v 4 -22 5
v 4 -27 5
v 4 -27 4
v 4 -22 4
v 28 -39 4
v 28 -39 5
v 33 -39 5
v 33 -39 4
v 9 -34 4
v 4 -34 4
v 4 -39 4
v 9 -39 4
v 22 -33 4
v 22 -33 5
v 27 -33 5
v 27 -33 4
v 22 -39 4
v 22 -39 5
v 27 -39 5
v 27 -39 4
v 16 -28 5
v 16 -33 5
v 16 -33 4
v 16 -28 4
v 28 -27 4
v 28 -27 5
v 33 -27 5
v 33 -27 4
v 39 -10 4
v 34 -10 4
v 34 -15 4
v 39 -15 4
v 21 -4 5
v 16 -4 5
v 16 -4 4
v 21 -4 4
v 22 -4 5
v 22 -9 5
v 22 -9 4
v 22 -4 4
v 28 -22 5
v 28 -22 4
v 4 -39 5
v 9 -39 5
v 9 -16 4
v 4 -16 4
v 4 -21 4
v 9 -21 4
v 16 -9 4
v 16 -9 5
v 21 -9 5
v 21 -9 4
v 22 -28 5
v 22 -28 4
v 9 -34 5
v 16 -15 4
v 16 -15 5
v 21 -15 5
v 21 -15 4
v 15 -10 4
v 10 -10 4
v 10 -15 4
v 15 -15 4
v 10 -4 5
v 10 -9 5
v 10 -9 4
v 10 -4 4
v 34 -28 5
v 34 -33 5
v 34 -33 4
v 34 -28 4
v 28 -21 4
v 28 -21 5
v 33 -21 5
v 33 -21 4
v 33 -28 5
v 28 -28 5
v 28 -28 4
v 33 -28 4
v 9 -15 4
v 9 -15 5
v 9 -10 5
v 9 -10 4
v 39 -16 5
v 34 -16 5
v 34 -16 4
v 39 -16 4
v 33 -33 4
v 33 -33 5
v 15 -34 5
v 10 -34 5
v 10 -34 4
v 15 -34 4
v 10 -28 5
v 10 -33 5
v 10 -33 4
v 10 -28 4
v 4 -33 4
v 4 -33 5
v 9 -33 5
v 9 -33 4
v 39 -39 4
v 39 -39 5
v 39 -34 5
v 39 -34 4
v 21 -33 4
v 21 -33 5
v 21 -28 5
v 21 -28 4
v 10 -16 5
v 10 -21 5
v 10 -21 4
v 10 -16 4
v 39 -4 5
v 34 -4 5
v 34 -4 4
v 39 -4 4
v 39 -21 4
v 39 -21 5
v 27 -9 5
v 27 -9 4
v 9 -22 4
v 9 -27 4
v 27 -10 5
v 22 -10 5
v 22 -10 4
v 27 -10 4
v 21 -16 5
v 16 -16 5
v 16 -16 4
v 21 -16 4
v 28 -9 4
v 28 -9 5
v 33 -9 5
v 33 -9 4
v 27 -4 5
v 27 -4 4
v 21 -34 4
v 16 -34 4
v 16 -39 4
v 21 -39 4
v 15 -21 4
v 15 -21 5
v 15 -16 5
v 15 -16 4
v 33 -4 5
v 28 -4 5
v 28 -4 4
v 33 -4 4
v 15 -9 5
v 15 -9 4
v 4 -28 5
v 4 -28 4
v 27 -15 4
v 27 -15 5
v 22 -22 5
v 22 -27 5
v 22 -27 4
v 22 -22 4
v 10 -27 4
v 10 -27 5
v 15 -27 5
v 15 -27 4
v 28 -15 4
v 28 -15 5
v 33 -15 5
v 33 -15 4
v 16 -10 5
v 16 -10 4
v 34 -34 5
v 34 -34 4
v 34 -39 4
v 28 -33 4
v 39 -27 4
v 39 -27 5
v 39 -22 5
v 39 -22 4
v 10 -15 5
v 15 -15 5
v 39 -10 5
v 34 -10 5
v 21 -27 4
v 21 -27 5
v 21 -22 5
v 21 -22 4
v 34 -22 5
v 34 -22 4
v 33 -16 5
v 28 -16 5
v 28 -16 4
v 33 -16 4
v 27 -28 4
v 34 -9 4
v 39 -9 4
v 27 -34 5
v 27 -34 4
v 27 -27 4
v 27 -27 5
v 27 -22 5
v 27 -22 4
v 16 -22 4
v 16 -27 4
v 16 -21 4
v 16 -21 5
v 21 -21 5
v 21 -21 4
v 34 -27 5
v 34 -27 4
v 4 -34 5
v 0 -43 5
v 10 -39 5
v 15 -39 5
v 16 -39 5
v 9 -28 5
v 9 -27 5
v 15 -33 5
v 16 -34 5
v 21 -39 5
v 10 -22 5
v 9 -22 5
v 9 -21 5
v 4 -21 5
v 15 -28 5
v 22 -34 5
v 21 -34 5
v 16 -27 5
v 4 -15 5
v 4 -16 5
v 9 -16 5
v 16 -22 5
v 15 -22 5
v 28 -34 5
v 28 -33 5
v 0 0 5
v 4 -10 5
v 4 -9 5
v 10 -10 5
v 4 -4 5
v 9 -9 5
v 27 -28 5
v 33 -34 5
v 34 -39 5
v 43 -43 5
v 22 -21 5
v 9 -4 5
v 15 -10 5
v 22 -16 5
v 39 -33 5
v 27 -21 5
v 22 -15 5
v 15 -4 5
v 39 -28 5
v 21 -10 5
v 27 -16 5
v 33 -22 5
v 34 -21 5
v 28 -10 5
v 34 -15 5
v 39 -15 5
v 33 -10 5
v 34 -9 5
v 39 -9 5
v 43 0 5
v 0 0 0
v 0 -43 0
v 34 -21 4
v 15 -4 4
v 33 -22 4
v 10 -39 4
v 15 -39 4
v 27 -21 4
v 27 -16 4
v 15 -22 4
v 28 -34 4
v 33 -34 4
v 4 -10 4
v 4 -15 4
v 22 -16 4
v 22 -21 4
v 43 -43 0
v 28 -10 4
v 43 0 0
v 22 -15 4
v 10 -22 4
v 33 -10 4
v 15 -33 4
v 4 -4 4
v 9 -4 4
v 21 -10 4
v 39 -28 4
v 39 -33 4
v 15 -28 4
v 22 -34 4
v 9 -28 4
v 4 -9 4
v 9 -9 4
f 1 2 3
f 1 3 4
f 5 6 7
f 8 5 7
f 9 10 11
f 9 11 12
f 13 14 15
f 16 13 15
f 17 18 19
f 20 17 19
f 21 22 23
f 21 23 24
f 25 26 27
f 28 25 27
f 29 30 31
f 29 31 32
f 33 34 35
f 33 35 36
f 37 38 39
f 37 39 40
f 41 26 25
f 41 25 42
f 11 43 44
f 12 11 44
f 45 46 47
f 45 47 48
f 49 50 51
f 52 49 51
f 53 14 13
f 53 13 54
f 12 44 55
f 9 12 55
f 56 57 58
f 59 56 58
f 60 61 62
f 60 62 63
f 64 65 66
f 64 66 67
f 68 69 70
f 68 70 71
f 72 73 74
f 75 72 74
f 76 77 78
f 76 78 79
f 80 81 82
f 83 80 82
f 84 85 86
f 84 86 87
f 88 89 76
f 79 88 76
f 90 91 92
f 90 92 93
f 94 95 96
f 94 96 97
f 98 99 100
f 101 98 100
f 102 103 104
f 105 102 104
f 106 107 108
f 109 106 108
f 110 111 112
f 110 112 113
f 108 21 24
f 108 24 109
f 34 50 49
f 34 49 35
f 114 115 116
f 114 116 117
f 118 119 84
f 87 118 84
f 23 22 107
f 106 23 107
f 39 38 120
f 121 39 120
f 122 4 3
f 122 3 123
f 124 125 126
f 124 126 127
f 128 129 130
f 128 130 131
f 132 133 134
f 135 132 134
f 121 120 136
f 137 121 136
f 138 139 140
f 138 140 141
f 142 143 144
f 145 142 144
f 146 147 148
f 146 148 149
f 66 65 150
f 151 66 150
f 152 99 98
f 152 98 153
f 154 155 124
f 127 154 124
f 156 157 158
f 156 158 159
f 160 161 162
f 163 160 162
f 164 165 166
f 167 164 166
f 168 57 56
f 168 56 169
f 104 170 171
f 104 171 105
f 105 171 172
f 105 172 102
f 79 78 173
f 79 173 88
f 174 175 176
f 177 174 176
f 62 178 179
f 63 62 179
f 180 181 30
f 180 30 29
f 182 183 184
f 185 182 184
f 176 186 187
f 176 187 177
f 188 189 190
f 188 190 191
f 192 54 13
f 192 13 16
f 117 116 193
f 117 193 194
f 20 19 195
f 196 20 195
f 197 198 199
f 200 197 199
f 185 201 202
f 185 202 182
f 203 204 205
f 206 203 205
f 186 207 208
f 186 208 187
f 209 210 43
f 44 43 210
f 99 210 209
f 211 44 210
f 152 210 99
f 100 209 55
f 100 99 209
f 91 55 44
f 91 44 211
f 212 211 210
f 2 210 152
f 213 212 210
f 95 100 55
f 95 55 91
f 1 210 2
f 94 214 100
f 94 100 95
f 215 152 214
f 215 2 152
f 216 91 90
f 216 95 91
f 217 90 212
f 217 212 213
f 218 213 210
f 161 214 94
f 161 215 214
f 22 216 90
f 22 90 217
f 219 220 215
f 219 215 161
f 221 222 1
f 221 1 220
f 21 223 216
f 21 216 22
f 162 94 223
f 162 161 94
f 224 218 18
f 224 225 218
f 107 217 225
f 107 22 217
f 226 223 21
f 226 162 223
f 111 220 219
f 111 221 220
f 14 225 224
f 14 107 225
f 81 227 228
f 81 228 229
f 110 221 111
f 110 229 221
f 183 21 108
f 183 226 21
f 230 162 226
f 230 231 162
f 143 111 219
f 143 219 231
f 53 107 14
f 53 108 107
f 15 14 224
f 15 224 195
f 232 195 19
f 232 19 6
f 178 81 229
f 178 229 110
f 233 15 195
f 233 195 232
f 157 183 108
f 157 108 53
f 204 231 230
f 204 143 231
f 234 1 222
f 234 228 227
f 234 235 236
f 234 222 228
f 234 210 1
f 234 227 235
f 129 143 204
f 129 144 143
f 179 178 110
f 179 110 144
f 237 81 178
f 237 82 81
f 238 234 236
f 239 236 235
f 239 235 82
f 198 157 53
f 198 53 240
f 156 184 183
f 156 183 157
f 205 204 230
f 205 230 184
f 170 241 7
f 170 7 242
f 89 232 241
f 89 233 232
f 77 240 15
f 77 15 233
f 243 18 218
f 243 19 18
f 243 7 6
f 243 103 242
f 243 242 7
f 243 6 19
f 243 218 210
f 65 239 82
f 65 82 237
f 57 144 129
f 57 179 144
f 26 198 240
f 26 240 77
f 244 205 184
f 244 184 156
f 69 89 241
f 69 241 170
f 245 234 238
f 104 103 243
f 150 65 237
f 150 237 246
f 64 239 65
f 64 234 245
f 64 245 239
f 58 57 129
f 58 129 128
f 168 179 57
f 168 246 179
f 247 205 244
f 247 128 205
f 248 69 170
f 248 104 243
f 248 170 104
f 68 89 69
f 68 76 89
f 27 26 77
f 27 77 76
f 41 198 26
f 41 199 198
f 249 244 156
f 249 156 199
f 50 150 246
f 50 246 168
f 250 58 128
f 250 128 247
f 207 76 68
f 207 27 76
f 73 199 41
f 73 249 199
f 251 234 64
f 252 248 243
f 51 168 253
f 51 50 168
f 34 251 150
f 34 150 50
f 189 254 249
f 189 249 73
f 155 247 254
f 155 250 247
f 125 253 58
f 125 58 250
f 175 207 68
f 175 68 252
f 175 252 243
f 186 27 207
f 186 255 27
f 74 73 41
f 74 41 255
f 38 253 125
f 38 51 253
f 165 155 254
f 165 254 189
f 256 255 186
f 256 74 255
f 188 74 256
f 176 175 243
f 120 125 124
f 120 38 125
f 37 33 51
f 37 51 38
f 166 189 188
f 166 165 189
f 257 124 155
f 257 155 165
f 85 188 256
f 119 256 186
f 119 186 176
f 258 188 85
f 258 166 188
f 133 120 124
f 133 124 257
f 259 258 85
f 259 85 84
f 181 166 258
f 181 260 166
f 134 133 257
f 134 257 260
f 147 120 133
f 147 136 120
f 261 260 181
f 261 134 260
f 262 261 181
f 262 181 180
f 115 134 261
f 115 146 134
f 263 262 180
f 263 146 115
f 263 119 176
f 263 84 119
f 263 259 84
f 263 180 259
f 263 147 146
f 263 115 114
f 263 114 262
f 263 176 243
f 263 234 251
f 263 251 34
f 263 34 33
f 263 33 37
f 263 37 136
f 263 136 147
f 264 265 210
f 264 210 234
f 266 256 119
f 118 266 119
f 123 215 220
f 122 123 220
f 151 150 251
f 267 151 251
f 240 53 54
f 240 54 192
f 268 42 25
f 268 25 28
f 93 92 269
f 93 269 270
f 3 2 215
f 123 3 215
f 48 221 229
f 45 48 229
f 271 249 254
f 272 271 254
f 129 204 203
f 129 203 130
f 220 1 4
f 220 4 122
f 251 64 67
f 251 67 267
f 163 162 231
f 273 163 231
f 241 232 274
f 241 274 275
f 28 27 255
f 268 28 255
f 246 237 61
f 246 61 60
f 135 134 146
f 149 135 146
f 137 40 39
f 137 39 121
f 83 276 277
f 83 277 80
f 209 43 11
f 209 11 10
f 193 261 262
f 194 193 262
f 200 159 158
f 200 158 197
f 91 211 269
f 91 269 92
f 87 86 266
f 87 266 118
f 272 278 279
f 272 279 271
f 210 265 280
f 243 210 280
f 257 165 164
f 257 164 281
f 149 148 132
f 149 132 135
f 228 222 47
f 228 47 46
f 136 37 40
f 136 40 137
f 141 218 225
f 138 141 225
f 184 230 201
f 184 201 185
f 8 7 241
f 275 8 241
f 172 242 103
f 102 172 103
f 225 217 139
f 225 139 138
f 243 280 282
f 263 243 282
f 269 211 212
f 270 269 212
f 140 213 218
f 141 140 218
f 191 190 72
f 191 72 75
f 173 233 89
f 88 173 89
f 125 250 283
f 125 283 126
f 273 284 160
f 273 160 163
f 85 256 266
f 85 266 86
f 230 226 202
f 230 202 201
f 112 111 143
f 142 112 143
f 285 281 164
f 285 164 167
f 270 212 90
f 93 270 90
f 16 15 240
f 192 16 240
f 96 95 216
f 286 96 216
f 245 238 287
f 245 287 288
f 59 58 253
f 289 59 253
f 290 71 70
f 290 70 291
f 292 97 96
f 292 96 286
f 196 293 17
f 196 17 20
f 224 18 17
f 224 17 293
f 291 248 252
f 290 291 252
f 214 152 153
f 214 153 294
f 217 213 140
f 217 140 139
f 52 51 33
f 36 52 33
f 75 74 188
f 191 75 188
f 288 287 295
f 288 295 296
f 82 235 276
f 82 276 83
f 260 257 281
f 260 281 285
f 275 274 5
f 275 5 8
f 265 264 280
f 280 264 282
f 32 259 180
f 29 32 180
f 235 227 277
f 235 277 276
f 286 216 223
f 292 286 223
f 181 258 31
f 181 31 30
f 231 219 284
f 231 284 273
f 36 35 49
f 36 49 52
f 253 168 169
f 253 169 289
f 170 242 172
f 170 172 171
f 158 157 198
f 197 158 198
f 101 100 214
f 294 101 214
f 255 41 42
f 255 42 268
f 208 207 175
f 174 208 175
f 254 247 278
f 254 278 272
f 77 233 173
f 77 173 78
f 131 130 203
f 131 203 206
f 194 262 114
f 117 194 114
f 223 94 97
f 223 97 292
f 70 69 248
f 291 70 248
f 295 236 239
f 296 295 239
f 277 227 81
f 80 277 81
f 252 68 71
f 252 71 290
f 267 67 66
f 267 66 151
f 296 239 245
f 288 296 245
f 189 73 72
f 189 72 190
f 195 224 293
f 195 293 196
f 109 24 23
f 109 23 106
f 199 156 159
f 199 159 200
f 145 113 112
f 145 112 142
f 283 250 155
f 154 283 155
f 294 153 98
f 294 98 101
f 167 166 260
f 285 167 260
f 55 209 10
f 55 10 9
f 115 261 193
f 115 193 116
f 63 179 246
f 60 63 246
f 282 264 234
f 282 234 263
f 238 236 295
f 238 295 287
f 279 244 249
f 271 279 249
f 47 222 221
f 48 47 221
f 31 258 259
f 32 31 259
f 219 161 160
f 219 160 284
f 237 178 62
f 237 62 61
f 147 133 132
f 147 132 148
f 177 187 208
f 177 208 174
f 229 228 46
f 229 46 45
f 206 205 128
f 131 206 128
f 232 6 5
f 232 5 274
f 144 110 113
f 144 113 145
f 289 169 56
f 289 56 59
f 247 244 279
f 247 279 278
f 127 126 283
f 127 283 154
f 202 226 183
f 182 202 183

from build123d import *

# Parameters (mm, degrees)
F0_W     = 43
F0_H     = 43
F1_DEPTH = 5
F2_W     = 5
F2_H     = 5
F3_DEPTH = 1


with BuildPart() as f1:
    # F0 (on Top) → F1 (new body)
    with BuildSketch(Plane.XY):
        with Locations((21.5, -21.5)):
            Rectangle(F0_W, F0_H)
    extrude(amount=F1_DEPTH)

    # F2 (on face) → F3 (cut)
    with BuildSketch(Plane.XY.offset(5)):
        with Locations((6.5, -6.5)):
            Rectangle(F2_W, F2_H)
        with Locations((6.5, -12.5)):
            Rectangle(F2_W, F2_H)
        with Locations((6.5, -18.5)):
            Rectangle(F2_W, F2_H)
        with Locations((6.5, -24.5)):
            Rectangle(F2_W, F2_H)
        with Locations((18.5, -6.5)):
            Rectangle(F2_W, F2_H)
        with Locations((18.5, -12.5)):
            Rectangle(F2_W, F2_H)
        with Locations((18.5, -18.5)):
            Rectangle(F2_W, F2_H)
        with Locations((30.5, -24.5)):
            Rectangle(F2_W, F2_H)
        with Locations((30.5, -30.5)):
            Rectangle(F2_W, F2_H)
        with Locations((30.5, -36.5)):
            Rectangle(F2_W, F2_H)
        with Locations((36.5, -6.5)):
            Rectangle(F2_W, F2_H)
        with Locations((36.5, -12.5)):
            Rectangle(F2_W, F2_H)
        with Locations((36.5, -18.5)):
            Rectangle(F2_W, F2_H)
        with Locations((36.5, -36.5)):
            Rectangle(F2_W, F2_H)
        with Locations((36.5, -30.5)):
            Rectangle(F2_W, F2_H)
        with Locations((36.5, -24.5)):
            Rectangle(F2_W, F2_H)
        with Locations((30.5, -18.5)):
            Rectangle(F2_W, F2_H)
        with Locations((30.5, -12.5)):
            Rectangle(F2_W, F2_H)
        with Locations((30.5, -6.5)):
            Rectangle(F2_W, F2_H)
        with Locations((24.5, -36.5)):
            Rectangle(F2_W, F2_H)
        with Locations((24.5, -30.5)):
            Rectangle(F2_W, F2_H)
        with Locations((24.5, -24.5)):
            Rectangle(F2_W, F2_H)
        with Locations((24.5, -18.5)):
            Rectangle(F2_W, F2_H)
        with Locations((24.5, -12.5)):
            Rectangle(F2_W, F2_H)
        with Locations((24.5, -6.5)):
            Rectangle(F2_W, F2_H)
        with Locations((18.5, -36.5)):
            Rectangle(F2_W, F2_H)
        with Locations((18.5, -30.5)):
            Rectangle(F2_W, F2_H)
        with Locations((12.5, -36.5)):
            Rectangle(F2_W, F2_H)
        with Locations((6.5, -36.5)):
            Rectangle(F2_W, F2_H)
        with Locations((6.5, -30.5)):
            Rectangle(F2_W, F2_H)
        with Locations((12.5, -30.5)):
            Rectangle(F2_W, F2_H)
        with Locations((12.5, -24.5)):
            Rectangle(F2_W, F2_H)
        with Locations((18.5, -24.5)):
            Rectangle(F2_W, F2_H)
        with Locations((12.5, -18.5)):
            Rectangle(F2_W, F2_H)
        with Locations((12.5, -12.5)):
            Rectangle(F2_W, F2_H)
        with Locations((12.5, -6.5)):
            Rectangle(F2_W, F2_H)
    extrude(amount=-F3_DEPTH, mode=Mode.SUBTRACT)


solid = f1.part
